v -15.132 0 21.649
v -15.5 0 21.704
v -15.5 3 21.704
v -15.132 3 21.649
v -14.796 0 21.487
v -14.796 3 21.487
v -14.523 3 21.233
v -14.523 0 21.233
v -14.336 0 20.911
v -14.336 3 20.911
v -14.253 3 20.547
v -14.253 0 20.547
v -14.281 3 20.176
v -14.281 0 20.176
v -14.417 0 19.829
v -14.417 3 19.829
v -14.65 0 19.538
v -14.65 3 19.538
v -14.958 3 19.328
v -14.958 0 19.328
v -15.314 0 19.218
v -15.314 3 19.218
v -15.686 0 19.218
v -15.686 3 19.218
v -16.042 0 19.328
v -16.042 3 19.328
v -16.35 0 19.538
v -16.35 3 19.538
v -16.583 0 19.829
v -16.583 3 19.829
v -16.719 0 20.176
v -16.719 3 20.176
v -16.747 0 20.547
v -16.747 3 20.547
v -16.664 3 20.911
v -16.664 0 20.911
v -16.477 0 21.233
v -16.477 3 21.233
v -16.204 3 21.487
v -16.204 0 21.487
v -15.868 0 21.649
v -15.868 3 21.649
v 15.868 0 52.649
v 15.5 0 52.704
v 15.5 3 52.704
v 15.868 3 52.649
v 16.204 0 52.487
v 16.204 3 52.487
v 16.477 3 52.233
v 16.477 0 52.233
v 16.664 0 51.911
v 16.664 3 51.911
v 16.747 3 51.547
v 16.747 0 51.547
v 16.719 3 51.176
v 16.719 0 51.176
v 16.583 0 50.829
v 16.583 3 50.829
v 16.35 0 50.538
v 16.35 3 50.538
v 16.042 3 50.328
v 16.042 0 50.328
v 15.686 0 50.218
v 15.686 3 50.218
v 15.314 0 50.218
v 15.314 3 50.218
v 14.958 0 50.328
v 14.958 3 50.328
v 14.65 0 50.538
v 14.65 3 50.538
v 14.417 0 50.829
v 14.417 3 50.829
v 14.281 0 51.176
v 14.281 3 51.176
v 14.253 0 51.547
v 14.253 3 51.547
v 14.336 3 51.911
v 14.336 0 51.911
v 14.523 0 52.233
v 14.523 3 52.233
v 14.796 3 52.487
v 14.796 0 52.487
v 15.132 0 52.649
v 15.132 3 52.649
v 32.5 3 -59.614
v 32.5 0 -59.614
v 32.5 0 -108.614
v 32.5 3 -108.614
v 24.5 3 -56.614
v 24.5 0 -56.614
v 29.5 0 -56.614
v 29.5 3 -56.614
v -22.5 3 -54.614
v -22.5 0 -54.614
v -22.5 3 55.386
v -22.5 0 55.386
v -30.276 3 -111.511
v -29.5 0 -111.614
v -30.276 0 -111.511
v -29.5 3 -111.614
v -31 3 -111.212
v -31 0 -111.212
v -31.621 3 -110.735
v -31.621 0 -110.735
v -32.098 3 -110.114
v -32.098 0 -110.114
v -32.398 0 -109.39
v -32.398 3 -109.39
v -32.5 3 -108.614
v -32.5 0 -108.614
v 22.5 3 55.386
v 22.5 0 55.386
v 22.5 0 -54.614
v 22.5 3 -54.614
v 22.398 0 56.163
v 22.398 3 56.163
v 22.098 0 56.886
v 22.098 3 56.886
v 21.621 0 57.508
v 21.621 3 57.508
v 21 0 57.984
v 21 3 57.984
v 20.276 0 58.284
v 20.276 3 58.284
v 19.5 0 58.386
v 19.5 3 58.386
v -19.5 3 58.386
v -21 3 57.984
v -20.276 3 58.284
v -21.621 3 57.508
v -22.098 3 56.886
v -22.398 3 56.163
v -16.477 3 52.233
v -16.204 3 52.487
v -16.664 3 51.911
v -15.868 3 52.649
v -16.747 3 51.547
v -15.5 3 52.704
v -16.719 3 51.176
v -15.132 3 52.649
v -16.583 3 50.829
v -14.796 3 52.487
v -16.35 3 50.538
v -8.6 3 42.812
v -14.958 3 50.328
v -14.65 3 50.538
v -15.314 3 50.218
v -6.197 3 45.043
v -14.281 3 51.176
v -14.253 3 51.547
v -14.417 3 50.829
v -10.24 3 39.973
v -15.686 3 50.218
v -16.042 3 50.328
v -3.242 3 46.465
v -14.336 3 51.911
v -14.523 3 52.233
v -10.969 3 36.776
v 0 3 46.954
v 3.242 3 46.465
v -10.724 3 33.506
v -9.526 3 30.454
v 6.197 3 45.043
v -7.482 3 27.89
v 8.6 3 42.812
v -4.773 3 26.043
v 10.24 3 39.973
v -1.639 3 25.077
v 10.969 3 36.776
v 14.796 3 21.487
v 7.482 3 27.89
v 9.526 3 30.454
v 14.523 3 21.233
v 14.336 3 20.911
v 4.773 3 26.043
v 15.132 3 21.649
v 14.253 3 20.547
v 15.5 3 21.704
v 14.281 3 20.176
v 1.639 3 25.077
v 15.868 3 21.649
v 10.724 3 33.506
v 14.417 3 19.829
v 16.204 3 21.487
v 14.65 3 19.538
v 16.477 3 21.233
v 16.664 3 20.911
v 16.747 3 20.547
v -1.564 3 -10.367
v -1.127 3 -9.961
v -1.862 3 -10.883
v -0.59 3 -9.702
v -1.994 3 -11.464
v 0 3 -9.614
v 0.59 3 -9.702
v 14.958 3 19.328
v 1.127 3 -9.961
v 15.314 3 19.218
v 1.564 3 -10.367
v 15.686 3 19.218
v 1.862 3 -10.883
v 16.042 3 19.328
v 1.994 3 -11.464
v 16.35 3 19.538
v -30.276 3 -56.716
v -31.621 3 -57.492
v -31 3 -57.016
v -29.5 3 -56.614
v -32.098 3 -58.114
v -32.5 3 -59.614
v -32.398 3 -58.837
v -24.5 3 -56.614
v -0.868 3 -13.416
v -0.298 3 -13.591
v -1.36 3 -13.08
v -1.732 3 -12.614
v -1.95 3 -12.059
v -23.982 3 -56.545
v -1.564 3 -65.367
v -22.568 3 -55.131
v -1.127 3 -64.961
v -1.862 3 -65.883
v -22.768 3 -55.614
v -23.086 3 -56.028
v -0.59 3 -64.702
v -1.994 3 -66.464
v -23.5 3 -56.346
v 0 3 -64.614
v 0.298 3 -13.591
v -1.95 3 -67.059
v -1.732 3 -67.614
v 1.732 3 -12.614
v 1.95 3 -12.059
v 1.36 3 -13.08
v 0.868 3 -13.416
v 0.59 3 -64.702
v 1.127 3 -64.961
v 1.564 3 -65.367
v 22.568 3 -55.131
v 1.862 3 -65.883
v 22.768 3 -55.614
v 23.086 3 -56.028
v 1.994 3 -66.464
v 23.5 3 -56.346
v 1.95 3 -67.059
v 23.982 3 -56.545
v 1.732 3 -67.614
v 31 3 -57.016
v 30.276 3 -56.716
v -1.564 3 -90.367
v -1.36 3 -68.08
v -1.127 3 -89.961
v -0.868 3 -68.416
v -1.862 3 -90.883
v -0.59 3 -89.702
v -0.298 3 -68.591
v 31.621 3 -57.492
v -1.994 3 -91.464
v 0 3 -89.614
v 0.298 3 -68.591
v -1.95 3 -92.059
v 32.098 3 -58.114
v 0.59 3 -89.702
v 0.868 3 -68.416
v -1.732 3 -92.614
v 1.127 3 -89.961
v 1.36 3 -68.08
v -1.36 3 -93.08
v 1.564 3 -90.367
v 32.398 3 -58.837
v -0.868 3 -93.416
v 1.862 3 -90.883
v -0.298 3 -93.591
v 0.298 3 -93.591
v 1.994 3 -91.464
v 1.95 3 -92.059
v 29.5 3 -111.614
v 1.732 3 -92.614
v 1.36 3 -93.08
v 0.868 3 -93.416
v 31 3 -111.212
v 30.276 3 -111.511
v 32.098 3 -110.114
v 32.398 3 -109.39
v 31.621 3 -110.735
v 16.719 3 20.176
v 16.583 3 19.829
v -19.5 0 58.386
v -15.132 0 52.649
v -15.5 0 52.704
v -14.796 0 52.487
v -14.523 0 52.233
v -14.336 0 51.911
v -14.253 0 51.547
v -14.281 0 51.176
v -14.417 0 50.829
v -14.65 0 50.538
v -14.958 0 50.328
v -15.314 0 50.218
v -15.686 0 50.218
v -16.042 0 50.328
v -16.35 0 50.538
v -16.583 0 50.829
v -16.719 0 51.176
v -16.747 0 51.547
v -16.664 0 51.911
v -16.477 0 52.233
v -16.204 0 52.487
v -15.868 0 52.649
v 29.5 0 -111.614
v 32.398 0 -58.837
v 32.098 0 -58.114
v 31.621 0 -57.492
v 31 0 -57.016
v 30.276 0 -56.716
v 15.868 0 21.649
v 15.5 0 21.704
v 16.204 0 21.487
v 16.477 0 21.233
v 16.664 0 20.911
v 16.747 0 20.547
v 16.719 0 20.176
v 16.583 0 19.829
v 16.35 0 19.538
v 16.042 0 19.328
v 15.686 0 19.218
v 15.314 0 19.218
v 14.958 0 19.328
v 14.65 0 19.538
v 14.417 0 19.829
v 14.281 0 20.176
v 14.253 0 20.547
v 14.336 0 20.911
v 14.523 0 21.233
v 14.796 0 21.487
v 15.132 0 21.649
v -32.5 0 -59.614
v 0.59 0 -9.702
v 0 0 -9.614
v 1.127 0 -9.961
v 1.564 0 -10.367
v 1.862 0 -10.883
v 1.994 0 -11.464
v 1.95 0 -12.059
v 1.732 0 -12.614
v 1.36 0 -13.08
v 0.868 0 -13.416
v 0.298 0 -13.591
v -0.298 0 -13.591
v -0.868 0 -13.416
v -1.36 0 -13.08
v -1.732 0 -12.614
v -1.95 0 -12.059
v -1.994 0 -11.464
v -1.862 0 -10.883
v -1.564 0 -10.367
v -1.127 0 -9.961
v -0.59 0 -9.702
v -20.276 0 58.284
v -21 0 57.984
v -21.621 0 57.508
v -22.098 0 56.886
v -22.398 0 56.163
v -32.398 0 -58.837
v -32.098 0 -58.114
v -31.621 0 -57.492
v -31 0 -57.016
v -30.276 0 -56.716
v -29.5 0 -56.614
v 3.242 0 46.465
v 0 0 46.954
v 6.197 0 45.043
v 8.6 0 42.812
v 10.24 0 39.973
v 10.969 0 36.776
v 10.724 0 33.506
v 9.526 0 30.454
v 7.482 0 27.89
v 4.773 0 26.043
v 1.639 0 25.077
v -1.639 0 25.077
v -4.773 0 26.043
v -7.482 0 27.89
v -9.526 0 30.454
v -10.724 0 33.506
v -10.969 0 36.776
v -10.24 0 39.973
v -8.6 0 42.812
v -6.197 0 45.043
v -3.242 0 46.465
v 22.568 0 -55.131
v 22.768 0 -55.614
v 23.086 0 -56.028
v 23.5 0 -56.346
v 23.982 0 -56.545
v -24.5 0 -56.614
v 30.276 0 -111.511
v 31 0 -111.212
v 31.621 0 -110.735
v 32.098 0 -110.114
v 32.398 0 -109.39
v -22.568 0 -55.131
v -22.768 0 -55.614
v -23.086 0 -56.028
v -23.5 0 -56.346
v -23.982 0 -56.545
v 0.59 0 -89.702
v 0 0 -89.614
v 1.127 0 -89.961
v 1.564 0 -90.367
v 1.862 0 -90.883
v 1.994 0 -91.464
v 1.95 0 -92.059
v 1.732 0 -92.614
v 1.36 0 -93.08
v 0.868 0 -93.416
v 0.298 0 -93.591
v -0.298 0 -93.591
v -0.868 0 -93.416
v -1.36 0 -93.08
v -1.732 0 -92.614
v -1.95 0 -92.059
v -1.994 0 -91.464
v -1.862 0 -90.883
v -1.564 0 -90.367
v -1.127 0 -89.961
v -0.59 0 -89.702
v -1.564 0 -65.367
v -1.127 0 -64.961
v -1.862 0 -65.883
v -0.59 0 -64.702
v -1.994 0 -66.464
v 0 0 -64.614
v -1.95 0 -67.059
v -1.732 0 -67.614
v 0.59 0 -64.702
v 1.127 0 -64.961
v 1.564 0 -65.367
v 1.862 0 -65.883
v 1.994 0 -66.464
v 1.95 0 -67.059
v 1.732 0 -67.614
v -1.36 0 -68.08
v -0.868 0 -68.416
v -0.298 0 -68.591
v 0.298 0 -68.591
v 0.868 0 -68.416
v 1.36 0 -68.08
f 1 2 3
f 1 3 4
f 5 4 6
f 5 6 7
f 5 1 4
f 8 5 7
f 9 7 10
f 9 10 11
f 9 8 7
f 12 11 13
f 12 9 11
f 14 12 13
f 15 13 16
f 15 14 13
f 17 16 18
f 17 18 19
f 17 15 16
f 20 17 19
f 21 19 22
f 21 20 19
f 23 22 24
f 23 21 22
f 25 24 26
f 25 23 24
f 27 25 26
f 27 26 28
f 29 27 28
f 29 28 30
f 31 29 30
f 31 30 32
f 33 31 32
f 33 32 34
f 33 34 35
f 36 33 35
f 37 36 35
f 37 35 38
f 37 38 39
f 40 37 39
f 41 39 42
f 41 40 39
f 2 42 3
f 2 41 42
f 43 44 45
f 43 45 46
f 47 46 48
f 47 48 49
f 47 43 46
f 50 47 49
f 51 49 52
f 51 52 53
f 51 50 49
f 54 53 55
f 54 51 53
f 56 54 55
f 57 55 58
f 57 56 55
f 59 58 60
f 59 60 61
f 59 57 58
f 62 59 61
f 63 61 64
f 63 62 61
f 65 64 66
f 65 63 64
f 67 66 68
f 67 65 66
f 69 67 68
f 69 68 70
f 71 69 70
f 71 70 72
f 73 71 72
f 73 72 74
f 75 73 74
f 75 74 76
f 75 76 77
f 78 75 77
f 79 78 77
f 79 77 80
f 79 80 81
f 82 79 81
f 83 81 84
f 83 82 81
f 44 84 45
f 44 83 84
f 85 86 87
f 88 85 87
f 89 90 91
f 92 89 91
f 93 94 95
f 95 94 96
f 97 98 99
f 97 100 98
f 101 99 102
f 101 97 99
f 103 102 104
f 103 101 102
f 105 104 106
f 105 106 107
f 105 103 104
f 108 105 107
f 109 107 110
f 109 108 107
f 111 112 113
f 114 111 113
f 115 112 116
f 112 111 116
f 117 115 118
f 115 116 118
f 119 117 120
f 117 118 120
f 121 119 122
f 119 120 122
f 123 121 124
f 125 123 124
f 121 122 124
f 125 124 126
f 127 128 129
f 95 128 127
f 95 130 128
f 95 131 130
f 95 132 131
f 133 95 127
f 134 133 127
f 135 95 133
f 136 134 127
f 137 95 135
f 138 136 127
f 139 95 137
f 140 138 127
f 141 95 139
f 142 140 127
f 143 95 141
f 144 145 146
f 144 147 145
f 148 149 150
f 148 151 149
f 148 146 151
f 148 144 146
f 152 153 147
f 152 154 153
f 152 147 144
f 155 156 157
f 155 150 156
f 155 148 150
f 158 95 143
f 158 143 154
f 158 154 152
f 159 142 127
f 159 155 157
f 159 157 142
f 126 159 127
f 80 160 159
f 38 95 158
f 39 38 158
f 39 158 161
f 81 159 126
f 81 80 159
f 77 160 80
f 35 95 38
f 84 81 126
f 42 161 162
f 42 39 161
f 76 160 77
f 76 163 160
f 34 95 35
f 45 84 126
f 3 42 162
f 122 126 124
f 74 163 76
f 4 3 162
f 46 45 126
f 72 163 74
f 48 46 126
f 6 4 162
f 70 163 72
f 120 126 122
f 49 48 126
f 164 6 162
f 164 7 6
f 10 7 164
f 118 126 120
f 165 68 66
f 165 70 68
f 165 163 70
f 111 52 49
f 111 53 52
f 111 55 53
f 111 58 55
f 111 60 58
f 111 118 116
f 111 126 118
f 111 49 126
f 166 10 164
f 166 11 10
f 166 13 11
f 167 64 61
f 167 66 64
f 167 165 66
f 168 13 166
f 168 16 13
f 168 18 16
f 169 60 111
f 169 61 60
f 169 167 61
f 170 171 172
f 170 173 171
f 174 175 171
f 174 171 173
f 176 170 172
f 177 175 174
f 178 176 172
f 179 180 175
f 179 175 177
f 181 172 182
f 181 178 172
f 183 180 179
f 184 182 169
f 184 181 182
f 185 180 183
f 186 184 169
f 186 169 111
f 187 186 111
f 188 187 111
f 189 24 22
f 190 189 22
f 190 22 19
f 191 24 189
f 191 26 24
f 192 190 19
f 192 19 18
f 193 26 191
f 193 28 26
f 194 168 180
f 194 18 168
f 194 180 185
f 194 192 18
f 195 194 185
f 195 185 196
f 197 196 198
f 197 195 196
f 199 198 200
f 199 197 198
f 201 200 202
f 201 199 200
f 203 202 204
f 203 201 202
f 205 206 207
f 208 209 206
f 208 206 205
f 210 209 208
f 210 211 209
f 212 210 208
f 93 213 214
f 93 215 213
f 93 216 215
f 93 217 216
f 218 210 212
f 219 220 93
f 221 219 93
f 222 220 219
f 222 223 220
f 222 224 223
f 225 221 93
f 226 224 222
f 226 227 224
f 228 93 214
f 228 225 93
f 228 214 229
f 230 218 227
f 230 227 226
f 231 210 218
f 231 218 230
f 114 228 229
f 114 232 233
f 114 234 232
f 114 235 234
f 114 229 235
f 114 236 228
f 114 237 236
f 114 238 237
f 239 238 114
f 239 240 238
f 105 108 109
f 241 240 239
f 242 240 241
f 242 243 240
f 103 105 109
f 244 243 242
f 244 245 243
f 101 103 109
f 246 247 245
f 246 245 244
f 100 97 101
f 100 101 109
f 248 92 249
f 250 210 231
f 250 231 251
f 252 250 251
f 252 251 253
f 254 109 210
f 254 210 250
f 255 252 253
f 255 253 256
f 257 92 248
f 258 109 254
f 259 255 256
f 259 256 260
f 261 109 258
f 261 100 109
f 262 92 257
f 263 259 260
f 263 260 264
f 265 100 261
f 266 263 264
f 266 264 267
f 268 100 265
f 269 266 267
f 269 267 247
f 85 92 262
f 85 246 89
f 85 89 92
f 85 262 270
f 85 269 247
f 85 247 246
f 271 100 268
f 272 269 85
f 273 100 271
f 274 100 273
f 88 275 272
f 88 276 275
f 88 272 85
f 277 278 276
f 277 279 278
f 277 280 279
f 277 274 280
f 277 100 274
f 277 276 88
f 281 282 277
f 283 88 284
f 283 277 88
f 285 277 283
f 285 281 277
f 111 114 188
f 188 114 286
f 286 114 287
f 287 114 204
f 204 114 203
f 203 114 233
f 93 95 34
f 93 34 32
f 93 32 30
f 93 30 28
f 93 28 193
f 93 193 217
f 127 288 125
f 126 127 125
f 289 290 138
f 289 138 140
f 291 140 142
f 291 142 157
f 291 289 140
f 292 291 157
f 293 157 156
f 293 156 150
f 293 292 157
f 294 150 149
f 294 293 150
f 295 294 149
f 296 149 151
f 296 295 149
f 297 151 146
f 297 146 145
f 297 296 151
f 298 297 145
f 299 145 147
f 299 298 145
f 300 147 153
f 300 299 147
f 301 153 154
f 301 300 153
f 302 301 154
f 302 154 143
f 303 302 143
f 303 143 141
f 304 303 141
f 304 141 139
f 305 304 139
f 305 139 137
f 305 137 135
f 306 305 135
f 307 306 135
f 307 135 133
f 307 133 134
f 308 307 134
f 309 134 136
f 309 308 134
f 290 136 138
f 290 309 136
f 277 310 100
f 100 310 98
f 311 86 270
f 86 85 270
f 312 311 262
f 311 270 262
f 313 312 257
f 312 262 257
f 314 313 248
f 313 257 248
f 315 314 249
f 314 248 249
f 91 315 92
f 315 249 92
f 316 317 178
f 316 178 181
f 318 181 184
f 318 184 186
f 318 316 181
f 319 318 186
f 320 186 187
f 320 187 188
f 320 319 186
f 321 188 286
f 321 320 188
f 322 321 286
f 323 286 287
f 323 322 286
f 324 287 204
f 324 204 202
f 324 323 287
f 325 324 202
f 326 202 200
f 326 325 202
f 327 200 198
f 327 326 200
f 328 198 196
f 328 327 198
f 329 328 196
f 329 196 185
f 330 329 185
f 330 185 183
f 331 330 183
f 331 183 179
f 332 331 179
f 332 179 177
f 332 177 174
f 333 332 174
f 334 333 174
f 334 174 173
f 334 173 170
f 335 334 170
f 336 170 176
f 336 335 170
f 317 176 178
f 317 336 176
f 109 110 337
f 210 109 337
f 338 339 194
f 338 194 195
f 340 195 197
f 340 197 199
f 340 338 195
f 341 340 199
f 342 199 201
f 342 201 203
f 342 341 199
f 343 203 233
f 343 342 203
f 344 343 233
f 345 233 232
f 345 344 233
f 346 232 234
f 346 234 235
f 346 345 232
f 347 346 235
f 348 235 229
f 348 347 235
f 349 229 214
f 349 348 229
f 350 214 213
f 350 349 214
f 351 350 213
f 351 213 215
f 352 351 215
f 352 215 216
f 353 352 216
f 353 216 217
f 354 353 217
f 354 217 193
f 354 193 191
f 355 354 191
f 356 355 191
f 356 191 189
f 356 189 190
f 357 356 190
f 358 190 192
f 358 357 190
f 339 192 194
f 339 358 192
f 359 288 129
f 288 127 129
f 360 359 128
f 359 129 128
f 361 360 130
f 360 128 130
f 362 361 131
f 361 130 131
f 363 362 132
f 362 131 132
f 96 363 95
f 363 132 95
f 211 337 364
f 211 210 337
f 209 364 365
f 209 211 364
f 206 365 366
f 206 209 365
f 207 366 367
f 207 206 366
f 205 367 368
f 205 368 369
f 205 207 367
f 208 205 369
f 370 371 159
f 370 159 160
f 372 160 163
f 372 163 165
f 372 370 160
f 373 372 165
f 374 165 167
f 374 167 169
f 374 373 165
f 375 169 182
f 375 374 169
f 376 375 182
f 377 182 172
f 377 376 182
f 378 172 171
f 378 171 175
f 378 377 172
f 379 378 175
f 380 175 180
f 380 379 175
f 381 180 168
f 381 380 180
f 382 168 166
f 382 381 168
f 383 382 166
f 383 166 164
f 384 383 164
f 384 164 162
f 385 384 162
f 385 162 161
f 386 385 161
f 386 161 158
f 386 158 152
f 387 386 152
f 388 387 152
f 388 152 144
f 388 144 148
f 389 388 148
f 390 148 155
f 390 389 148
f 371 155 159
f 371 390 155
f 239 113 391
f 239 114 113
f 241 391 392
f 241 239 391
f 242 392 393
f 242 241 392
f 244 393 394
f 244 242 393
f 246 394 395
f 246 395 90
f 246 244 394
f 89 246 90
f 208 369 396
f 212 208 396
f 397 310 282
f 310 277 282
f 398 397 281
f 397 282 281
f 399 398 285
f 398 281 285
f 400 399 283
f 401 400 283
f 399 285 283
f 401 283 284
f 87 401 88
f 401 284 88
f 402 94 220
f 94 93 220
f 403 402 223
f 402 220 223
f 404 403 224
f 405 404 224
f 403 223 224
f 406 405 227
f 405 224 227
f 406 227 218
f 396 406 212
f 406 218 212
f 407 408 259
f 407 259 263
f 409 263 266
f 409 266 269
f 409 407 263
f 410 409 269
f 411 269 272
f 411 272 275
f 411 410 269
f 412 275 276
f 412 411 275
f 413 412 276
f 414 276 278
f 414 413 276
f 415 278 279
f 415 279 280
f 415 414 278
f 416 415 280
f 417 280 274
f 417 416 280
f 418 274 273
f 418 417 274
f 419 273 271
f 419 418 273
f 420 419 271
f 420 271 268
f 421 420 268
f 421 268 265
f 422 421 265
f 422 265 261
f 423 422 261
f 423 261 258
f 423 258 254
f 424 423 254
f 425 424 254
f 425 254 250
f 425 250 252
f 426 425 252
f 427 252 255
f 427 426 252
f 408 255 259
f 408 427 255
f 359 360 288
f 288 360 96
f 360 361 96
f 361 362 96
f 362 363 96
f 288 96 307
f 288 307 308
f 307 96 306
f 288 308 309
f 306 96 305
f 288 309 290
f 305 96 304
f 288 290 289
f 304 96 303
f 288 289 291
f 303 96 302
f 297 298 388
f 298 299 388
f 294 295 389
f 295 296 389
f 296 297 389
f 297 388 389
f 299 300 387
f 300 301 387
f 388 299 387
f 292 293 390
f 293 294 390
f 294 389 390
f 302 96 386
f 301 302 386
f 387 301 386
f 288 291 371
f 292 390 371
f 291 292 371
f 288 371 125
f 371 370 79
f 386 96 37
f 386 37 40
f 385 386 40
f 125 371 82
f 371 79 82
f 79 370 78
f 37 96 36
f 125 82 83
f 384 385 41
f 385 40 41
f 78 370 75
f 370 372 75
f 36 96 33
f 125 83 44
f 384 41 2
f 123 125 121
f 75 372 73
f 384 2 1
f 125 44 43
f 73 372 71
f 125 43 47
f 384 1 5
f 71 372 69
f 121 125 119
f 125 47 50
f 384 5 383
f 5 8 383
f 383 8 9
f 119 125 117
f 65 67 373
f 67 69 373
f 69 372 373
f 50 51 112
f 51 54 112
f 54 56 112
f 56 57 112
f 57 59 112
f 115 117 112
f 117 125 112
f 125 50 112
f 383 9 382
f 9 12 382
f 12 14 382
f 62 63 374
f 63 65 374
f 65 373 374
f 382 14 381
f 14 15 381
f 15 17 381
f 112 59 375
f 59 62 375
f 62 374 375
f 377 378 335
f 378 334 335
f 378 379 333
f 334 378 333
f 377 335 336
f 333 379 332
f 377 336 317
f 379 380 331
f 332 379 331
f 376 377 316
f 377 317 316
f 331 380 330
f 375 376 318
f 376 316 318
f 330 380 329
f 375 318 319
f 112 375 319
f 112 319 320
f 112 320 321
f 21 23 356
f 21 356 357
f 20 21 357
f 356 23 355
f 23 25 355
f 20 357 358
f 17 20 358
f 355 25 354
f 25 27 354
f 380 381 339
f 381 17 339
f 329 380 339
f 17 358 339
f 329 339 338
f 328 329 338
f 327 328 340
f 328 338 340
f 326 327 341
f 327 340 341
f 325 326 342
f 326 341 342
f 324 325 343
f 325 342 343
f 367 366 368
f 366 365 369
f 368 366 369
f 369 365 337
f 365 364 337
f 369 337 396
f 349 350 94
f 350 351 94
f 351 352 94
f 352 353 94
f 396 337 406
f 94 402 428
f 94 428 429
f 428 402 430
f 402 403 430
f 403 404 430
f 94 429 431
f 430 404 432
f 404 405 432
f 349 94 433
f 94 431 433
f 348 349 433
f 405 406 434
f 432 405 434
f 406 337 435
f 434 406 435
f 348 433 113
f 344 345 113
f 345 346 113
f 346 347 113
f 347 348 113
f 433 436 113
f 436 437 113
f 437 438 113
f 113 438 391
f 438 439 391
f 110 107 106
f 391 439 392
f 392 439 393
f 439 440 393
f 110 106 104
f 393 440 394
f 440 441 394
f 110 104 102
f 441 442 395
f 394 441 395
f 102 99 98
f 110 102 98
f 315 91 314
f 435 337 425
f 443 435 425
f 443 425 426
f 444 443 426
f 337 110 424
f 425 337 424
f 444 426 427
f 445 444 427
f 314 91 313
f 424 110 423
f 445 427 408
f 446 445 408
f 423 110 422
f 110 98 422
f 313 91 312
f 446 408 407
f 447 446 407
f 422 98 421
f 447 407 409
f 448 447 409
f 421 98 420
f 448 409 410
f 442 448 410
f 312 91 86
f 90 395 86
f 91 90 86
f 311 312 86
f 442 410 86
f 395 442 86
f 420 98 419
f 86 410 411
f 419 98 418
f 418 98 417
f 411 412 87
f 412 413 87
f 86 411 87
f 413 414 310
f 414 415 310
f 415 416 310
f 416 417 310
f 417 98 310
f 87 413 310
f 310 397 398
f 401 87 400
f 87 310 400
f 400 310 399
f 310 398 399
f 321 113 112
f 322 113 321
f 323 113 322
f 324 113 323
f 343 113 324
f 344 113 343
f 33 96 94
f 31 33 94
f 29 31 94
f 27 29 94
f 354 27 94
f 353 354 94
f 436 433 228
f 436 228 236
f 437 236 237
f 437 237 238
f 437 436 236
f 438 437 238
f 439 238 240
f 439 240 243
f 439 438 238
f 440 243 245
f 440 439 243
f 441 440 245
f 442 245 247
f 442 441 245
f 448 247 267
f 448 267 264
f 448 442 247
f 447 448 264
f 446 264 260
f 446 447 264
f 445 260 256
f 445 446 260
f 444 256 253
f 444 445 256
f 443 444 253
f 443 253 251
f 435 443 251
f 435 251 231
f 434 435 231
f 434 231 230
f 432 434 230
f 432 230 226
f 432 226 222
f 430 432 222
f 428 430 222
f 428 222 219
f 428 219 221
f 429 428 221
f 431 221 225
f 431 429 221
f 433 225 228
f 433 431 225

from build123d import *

# Parameters (mm, degrees)
SKETCH1_R           = 2
SKETCH1_R_2         = 1.25
SKETCH1_R_3         = 11
BOSS_EXTRUDE1_DEPTH = 3
FILLET1_R           = 3
FILLET2_R           = 3
FILLET3_R           = 3
FILLET4_R           = 3
FILLET5_R           = 3
FILLET7_R           = 3
FILLET8_R           = 2
FILLET9_R           = 2


with BuildPart() as part:
    # Sketch1 → Boss-Extrude1 (new body)
    with BuildSketch(Plane(origin=(0, 0, 0), x_dir=(1, 0, 0), z_dir=(0, 1, 0))):
        Polygon((0, 111.61362417), (-32.5, 111.61362417), (-32.5, 56.61362417), (-22.5, 56.61362417), (-22.5, -58.38637583), (0, -58.38637583), (22.5, -58.38637583), (22.5, 56.61362417), (32.5, 56.61362417), (32.5, 111.61362417), align=None)
        with Locations(Location((0, 91.61362417, 0), (0, 0, 270))):
            Circle(SKETCH1_R, mode=Mode.SUBTRACT)
        with Locations(Location((0, 66.61362417, 0), (0, 0, 270))):
            Circle(SKETCH1_R, mode=Mode.SUBTRACT)
        with Locations(Location((-15.5, -20.454039675, 0), (0, 0, 270))):
            Circle(SKETCH1_R_2, mode=Mode.SUBTRACT)
        with Locations(Location((-15.5, -51.454039675, 0), (0, 0, 270))):
            Circle(SKETCH1_R_2, mode=Mode.SUBTRACT)
        with Locations(Location((15.5, -51.454039675, 0), (0, 0, 270))):
            Circle(SKETCH1_R_2, mode=Mode.SUBTRACT)
        with Locations(Location((15.5, -20.454039675, 0), (0, 0, 270))):
            Circle(SKETCH1_R_2, mode=Mode.SUBTRACT)
        with Locations(Location((0, -35.954039675, 0), (0, 0, 270))):
            Circle(SKETCH1_R_3, mode=Mode.SUBTRACT)
        with Locations(Location((0, 11.61362417, 0), (0, 0, 270))):
            Circle(SKETCH1_R, mode=Mode.SUBTRACT)
    extrude(amount=BOSS_EXTRUDE1_DEPTH)

    # Fillet1
    fillet1_edges = [part.edges().sort_by_distance(p)[0] for p in [
        (32.5, 1.5, -111.61362417),
    ]]
    fillet(fillet1_edges, radius=FILLET1_R)

    # Fillet2
    fillet2_edges = [part.edges().sort_by_distance(p)[0] for p in [
        (-32.5, 1.5, -111.61362417),
    ]]
    fillet(fillet2_edges, radius=FILLET2_R)

    # Fillet3
    fillet3_edges = [part.edges().sort_by_distance(p)[0] for p in [
        (-32.5, 1.5, -56.61362417),
    ]]
    fillet(fillet3_edges, radius=FILLET3_R)

    # Fillet4
    fillet4_edges = [part.edges().sort_by_distance(p)[0] for p in [
        (32.5, 1.5, -56.61362417),
    ]]
    fillet(fillet4_edges, radius=FILLET4_R)

    # Fillet5
    fillet5_edges = [part.edges().sort_by_distance(p)[0] for p in [
        (22.5, 1.5, 58.38637583),
    ]]
    fillet(fillet5_edges, radius=FILLET5_R)

    # Fillet7
    fillet7_edges = [part.edges().sort_by_distance(p)[0] for p in [
        (-22.5, 1.5, 58.38637583),
    ]]
    fillet(fillet7_edges, radius=FILLET7_R)

    # Fillet8
    fillet8_edges = [part.edges().sort_by_distance(p)[0] for p in [
        (-22.5, 1.5, -56.61362417),
    ]]
    fillet(fillet8_edges, radius=FILLET8_R)

    # Fillet9
    fillet9_edges = [part.edges().sort_by_distance(p)[0] for p in [
        (22.5, 1.5, -56.61362417),
    ]]
    fillet(fillet9_edges, radius=FILLET9_R)


solid = part.part
